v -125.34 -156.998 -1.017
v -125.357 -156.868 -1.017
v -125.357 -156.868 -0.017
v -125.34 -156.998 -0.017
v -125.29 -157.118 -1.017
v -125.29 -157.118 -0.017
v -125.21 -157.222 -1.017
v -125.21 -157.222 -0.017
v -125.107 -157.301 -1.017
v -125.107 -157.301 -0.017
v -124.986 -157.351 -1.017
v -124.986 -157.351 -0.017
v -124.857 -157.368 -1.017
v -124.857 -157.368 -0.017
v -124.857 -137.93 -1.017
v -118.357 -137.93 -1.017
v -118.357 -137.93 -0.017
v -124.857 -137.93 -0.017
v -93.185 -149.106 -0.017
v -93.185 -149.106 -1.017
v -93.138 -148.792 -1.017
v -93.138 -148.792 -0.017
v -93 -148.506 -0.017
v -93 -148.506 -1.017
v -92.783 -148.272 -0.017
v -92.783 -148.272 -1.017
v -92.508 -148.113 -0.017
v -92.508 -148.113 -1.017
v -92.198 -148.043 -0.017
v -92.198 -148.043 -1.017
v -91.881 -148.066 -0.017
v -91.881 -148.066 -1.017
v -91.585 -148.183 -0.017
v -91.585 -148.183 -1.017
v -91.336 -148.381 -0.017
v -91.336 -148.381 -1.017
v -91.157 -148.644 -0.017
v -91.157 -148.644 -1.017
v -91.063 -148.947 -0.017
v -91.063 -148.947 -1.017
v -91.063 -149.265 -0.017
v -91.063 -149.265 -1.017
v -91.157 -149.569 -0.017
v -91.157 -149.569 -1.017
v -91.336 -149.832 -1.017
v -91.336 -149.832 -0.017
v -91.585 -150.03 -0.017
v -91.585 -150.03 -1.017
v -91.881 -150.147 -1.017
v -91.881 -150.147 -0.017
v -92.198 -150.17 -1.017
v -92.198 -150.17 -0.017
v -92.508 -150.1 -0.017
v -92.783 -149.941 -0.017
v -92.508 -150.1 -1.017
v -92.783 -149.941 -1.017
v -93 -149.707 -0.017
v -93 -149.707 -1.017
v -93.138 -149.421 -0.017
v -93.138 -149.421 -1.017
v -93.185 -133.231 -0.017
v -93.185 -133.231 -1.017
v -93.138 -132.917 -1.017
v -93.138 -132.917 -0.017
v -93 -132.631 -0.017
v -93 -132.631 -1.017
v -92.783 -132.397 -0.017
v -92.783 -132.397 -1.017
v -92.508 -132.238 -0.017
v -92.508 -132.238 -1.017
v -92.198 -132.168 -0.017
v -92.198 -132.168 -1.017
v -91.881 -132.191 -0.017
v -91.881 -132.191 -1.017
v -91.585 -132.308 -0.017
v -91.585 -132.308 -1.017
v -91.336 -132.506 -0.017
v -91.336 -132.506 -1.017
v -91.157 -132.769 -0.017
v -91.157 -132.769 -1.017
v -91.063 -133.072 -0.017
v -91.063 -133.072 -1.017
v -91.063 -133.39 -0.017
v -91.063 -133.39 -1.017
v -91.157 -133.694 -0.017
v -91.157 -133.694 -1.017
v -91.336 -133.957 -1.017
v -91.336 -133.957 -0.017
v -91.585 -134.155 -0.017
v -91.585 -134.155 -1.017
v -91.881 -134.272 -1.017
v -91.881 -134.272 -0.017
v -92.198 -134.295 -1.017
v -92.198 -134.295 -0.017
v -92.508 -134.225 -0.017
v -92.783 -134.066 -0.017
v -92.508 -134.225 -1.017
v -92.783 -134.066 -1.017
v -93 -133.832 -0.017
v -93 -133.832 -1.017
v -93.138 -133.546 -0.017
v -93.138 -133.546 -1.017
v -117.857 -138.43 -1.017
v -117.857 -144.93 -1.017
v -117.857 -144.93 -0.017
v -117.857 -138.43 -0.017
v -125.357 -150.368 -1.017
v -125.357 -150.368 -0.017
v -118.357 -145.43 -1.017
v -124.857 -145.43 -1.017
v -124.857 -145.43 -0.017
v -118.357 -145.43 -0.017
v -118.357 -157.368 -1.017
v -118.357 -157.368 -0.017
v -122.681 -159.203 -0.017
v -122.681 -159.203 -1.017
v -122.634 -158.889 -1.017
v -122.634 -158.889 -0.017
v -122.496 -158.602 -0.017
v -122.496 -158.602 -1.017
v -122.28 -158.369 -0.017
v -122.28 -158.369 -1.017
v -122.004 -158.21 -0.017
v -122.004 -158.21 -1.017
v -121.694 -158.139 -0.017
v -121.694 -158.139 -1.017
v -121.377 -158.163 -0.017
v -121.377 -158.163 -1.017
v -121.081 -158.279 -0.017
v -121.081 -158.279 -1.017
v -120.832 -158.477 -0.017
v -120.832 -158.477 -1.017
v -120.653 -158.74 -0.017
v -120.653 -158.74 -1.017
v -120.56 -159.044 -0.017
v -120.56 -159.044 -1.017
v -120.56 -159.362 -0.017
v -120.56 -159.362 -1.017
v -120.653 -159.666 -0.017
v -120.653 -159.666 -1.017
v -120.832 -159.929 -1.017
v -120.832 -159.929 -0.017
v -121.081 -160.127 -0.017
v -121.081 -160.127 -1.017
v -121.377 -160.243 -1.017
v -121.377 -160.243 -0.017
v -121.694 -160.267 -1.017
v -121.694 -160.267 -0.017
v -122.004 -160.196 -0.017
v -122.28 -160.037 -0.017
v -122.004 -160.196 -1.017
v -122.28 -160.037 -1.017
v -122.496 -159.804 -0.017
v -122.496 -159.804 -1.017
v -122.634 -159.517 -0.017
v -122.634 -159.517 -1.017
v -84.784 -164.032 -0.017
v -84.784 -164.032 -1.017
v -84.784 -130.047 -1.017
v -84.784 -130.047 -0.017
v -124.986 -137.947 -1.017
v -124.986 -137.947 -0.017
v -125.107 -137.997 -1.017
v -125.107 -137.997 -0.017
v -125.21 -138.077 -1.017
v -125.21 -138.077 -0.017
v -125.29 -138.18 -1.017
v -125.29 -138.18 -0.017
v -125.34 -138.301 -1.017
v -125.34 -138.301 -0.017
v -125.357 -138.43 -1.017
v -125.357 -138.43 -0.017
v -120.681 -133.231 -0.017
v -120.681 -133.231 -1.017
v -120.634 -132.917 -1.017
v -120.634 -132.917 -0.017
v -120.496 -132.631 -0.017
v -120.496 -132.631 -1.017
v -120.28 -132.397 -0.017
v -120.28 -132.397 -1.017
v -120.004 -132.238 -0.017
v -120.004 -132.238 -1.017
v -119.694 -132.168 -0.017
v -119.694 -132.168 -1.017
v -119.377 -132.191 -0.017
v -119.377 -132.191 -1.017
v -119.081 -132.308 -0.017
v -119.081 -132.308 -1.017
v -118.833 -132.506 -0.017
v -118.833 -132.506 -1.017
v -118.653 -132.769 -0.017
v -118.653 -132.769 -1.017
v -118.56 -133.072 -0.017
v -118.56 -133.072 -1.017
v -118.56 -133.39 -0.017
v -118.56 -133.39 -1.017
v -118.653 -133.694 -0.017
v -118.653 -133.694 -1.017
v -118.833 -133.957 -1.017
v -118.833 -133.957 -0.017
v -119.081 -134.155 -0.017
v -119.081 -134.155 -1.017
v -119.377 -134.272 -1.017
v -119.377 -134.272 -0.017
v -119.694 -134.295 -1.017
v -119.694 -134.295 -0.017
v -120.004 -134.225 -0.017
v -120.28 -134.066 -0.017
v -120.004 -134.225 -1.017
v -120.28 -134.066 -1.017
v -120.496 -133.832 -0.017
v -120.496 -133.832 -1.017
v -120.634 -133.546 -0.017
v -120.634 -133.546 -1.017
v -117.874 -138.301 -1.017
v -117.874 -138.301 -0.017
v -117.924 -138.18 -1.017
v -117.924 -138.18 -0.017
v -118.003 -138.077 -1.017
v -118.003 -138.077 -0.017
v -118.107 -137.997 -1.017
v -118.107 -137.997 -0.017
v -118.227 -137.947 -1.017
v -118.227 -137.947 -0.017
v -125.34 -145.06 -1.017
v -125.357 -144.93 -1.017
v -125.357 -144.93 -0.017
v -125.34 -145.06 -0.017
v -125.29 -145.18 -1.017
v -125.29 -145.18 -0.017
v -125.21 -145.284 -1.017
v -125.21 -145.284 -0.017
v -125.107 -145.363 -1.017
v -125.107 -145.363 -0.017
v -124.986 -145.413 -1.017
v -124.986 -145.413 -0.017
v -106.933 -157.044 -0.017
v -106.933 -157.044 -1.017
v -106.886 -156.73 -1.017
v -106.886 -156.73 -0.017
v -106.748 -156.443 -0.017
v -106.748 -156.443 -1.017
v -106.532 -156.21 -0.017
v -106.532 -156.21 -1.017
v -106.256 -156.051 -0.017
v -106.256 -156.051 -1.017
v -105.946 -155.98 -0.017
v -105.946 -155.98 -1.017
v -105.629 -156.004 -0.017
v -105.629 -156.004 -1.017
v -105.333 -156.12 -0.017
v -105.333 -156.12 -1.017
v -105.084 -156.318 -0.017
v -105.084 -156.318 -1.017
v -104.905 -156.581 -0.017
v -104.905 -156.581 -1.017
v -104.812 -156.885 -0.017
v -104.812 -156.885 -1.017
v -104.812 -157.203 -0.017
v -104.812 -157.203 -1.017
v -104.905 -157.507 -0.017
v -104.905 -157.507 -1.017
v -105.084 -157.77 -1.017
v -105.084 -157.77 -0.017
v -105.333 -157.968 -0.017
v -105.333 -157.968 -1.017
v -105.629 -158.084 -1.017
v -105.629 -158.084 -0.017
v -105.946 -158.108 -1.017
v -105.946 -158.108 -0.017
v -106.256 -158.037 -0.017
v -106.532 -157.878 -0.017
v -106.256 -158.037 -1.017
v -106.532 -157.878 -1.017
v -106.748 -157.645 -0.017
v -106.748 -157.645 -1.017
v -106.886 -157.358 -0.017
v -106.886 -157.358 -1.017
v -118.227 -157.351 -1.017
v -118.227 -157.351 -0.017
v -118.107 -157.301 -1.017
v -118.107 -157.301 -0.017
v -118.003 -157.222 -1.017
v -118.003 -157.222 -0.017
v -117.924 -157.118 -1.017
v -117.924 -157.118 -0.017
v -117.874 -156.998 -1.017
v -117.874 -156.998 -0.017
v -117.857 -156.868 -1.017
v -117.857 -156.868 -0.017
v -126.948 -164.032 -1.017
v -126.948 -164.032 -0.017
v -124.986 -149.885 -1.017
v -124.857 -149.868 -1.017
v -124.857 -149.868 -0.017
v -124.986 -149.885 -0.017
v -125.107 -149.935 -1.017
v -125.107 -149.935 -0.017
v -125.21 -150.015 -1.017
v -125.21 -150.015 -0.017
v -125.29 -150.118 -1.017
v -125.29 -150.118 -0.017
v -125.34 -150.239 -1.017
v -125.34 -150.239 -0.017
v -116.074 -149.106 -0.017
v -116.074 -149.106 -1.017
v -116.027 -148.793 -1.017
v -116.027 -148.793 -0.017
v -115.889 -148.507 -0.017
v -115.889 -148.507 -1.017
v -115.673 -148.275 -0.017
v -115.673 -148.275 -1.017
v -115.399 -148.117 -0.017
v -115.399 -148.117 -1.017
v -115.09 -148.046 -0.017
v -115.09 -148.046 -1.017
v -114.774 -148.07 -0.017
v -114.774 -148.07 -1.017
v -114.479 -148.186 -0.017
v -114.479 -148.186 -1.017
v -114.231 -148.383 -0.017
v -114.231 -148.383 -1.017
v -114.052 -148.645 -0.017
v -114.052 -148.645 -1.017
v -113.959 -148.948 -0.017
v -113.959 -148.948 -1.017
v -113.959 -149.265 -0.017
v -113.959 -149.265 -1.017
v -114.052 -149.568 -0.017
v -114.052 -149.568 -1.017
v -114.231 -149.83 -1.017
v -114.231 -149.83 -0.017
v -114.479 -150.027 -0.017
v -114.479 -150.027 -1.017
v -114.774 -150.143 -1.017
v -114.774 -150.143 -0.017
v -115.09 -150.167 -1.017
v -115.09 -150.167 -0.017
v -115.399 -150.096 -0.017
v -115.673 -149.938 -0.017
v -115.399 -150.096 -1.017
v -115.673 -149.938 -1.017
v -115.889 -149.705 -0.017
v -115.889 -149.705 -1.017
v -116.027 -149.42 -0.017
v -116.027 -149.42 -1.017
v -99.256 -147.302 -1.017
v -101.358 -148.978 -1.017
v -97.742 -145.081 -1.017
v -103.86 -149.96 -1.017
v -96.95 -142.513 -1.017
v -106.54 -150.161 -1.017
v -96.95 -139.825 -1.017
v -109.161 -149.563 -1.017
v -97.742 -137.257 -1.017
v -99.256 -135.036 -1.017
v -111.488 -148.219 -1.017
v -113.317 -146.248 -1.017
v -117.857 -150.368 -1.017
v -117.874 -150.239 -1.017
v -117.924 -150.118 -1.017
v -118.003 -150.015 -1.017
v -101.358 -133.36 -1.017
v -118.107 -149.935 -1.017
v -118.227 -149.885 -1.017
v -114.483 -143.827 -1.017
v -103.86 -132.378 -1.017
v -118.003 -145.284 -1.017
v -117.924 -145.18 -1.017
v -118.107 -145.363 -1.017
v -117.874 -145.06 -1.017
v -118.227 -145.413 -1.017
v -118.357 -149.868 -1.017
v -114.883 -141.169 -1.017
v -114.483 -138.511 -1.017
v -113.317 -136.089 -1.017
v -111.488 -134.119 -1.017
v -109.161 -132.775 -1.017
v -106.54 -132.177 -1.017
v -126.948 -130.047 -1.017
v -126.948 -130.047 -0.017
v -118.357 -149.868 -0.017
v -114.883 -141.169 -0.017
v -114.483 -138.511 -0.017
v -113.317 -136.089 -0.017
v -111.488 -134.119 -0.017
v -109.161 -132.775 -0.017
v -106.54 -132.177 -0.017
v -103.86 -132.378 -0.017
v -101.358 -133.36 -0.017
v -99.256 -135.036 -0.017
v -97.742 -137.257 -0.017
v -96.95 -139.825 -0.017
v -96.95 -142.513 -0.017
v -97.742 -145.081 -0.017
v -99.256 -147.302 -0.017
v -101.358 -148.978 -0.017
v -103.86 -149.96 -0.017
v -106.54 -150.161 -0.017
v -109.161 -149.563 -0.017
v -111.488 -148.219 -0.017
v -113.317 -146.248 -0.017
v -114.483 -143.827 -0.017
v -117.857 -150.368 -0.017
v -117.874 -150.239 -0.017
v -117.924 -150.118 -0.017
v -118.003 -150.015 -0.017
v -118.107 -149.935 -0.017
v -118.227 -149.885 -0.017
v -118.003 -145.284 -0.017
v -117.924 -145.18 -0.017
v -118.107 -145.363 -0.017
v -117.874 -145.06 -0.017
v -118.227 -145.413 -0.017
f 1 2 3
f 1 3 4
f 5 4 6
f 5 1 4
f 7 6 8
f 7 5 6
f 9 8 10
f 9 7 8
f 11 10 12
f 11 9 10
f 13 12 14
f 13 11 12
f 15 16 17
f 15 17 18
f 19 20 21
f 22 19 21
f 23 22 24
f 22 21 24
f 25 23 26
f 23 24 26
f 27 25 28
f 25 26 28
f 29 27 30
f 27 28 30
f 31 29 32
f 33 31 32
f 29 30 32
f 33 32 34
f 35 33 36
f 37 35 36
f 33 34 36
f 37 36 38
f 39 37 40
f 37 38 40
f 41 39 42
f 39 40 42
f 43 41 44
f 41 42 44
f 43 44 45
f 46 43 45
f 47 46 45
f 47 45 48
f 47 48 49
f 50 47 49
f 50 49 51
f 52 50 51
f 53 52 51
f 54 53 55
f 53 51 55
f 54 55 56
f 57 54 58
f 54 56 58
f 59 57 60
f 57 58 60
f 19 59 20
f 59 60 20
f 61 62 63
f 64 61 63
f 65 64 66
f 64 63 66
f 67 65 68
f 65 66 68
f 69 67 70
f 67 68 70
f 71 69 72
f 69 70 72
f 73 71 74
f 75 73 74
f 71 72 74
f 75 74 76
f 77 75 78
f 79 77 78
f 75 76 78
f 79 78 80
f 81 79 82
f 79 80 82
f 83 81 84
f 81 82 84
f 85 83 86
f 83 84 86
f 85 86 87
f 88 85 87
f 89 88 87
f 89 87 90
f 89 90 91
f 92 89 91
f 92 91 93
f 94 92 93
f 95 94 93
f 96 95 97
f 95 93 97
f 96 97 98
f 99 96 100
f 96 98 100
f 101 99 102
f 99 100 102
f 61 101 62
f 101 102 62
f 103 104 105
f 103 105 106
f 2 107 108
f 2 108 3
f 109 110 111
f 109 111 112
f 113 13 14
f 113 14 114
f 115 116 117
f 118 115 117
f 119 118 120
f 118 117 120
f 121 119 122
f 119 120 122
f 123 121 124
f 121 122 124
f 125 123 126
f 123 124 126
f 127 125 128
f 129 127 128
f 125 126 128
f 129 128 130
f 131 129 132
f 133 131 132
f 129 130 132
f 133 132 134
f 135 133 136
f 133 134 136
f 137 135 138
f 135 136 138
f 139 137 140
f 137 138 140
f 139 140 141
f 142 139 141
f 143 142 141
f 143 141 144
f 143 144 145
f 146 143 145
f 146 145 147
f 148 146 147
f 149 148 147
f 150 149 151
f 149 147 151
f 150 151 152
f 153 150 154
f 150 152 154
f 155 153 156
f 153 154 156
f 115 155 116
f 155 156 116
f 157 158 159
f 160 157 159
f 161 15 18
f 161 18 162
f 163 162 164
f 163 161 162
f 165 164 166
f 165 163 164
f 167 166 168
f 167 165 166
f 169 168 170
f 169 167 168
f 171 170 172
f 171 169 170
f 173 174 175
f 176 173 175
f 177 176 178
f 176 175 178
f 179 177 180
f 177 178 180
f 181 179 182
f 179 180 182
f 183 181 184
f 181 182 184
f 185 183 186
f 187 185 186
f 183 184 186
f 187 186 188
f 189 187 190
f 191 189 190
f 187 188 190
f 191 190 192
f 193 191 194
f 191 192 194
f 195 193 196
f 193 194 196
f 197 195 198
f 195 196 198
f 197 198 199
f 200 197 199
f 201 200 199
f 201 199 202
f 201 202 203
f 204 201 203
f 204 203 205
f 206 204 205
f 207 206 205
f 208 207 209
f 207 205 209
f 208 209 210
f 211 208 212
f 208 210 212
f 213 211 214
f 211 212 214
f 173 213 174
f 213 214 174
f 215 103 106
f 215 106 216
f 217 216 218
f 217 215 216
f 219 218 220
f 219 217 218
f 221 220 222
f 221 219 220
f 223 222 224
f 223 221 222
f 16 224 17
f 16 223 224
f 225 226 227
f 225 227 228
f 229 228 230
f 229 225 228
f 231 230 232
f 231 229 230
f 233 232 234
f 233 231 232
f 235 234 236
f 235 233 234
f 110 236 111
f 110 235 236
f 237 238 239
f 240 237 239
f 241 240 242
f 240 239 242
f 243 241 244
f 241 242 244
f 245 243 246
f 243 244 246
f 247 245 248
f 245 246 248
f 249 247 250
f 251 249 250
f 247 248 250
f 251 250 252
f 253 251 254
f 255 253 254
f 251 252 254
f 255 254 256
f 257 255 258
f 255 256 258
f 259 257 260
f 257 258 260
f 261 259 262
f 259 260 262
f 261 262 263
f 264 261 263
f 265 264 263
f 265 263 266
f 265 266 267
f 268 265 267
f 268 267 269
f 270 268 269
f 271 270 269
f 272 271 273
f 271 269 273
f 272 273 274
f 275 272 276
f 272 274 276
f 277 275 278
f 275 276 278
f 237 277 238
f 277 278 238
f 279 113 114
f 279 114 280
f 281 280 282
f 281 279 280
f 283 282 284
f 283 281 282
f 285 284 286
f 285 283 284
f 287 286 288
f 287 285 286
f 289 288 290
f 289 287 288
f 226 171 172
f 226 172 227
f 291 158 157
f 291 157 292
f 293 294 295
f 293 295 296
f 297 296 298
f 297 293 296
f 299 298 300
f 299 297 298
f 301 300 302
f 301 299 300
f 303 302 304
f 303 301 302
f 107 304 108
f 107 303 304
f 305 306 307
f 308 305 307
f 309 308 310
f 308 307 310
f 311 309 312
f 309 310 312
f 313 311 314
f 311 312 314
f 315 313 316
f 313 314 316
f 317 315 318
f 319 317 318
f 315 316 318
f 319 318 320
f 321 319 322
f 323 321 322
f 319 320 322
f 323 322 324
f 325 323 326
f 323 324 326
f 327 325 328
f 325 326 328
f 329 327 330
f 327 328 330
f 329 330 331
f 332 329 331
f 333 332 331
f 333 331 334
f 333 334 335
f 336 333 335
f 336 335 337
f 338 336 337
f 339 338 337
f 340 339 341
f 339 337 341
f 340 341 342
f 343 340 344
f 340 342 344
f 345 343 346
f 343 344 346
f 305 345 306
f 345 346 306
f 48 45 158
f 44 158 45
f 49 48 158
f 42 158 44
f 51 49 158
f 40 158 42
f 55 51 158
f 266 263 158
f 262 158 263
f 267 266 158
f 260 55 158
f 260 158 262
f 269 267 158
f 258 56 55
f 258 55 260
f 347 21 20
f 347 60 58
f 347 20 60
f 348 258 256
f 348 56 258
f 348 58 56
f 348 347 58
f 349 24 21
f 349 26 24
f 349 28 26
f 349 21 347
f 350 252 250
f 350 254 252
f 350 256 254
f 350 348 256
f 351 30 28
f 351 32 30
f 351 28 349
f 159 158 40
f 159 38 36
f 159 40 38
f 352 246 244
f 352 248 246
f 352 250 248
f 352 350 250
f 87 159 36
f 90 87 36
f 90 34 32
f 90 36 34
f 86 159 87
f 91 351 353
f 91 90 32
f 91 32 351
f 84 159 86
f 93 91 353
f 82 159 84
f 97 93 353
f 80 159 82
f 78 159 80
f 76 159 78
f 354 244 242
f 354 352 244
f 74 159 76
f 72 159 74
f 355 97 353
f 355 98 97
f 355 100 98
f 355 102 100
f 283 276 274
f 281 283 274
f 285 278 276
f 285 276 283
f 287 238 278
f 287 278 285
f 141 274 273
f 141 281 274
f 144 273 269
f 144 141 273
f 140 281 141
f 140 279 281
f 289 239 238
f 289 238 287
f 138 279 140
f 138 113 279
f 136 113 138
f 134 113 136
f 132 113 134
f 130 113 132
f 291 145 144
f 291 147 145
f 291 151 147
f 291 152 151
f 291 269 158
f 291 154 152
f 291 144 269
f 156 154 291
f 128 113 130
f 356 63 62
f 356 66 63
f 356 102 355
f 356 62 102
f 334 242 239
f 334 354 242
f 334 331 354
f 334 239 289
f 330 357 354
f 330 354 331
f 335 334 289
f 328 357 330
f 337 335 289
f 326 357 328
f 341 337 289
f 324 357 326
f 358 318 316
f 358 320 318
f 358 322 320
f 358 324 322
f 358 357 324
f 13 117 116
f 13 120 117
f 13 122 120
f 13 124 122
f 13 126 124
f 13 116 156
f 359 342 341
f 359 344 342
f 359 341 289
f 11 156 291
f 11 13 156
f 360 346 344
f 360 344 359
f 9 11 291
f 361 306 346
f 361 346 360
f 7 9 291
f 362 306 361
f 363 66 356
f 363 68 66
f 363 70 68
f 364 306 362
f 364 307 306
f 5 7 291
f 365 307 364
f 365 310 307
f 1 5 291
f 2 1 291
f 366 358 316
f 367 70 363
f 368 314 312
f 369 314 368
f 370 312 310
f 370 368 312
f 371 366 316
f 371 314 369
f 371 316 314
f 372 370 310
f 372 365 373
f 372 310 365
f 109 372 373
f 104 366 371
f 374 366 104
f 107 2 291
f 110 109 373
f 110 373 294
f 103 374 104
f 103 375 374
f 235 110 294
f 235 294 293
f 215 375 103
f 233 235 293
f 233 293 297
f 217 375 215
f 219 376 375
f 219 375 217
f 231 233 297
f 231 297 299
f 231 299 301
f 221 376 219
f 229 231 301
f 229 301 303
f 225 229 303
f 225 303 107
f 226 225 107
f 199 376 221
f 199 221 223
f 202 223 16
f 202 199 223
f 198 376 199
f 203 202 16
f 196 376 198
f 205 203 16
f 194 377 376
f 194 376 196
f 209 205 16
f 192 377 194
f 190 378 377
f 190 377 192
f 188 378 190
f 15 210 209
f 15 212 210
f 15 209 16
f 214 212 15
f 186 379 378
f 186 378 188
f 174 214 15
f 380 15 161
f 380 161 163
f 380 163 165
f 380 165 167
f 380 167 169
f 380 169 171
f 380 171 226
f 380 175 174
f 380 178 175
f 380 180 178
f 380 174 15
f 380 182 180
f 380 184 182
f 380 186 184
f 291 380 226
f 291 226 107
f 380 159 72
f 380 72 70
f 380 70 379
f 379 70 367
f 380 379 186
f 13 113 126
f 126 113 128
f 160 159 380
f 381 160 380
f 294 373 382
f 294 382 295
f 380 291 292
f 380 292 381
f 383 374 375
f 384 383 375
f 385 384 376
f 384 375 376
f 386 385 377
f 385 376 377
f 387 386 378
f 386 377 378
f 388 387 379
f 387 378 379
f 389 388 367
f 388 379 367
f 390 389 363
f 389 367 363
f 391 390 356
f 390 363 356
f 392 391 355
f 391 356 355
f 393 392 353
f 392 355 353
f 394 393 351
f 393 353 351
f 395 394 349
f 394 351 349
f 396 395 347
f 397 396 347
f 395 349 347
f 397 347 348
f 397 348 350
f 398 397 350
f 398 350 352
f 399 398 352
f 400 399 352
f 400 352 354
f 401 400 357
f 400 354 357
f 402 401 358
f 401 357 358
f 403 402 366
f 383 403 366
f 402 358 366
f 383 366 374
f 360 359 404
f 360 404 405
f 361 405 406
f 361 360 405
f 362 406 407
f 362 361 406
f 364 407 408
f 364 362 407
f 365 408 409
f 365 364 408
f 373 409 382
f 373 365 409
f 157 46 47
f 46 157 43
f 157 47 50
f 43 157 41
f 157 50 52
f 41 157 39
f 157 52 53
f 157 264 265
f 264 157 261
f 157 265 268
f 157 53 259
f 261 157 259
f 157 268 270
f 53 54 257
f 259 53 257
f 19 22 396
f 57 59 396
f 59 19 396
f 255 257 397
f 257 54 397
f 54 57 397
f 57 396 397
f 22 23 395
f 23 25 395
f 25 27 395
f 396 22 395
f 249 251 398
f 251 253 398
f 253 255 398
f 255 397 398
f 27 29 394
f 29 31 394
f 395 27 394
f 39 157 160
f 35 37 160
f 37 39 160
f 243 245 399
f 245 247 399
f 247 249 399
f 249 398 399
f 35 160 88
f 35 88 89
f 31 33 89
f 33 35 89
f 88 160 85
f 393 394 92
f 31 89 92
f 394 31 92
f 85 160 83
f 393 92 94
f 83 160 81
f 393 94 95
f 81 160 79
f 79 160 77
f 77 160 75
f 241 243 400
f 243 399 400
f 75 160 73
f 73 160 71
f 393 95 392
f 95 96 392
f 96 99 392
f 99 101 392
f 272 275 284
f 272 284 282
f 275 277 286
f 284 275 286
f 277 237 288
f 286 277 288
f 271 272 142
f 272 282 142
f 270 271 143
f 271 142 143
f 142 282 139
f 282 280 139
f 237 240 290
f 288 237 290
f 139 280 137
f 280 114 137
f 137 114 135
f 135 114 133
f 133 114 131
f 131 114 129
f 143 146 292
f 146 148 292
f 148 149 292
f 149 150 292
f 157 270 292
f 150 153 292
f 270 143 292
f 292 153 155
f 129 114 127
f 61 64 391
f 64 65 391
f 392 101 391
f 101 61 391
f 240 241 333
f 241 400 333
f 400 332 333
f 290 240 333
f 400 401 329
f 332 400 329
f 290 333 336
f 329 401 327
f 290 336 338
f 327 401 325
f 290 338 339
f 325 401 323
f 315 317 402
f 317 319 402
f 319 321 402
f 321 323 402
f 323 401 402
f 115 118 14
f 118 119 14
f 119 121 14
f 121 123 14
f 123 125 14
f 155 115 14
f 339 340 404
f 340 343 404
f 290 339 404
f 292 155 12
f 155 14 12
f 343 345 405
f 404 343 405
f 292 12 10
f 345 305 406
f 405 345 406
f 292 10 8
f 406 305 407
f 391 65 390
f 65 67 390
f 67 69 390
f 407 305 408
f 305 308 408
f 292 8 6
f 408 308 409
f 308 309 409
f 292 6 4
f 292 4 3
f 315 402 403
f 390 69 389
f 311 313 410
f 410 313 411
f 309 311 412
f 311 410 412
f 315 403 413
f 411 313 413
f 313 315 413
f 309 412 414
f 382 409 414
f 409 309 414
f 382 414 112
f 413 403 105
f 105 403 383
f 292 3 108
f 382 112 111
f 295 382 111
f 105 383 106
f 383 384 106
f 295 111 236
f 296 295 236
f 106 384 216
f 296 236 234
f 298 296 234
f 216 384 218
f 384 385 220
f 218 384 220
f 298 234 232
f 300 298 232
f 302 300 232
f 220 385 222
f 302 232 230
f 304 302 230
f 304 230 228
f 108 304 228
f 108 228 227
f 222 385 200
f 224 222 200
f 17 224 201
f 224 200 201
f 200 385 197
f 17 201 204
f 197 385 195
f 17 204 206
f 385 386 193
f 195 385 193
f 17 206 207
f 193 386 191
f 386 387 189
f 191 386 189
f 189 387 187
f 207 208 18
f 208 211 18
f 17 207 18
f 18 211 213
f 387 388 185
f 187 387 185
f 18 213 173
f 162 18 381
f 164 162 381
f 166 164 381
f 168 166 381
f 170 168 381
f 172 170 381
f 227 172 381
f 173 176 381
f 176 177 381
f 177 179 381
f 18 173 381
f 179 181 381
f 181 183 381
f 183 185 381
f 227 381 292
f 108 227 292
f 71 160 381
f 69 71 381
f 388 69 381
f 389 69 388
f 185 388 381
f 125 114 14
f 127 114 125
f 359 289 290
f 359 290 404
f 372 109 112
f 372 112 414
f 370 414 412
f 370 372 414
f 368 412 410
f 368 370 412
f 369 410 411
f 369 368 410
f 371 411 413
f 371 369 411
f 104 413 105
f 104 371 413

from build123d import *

# Parameters (mm, degrees)
SKETCH1_W           = 42.164
SKETCH1_H           = 33.9852
SKETCH1_R           = 9.017
SKETCH1_R_2         = 1.0668
SKETCH1_R_3         = 1.063335115
BOSS_EXTRUDE1_DEPTH = 1


with BuildPart() as part:
    # Sketch1 → Boss-Extrude1 (new body)
    with BuildSketch(Plane(origin=(0, 0, -1.017418828), x_dir=(-1, 0, 0), z_dir=(0, 0, -1))):
        with Locations((105.86640625, -147.03953125)):
            Rectangle(SKETCH1_W, SKETCH1_H)
        with Locations((105.86640625, -141.16895625)):
            Circle(SKETCH1_R, mode=Mode.SUBTRACT)
        with Locations((92.118252965, -149.10645625)):
            Circle(SKETCH1_R_2, mode=Mode.SUBTRACT)
        with Locations((92.118252965, -133.23145625)):
            Circle(SKETCH1_R_2, mode=Mode.SUBTRACT)
        with Locations((119.614559536, -133.23145625)):
            Circle(SKETCH1_R_2, mode=Mode.SUBTRACT)
        with Locations((105.86640625, -157.04395625)):
            Circle(SKETCH1_R_2, mode=Mode.SUBTRACT)
        with Locations((115.01040625, -149.10645625)):
            Circle(SKETCH1_R_3, mode=Mode.SUBTRACT)
        with Locations((121.614405679, -159.20295625)):
            Circle(SKETCH1_R_2, mode=Mode.SUBTRACT)
        with BuildLine():
            Line((118.356545978, -137.93013125), (124.856545978, -137.93013125))
            ThreePointArc((124.856545978, -137.93013125), (125.210099369, -138.07657786), (125.356545978, -138.43013125))
            Line((125.356545978, -138.43013125), (125.356545978, -144.93013125))
            ThreePointArc((125.356545978, -144.93013125), (125.210099369, -145.283684641), (124.856545978, -145.43013125))
            Line((124.856545978, -145.43013125), (118.356545978, -145.43013125))
            ThreePointArc((118.356545978, -145.43013125), (118.002992588, -145.283684641), (117.856545978, -144.93013125))
            Line((117.856545978, -144.93013125), (117.856545978, -138.43013125))
            ThreePointArc((117.856545978, -138.43013125), (118.002992588, -138.07657786), (118.356545978, -137.93013125))
        make_face(mode=Mode.SUBTRACT)
        with BuildLine():
            Line((124.856545978, -157.36813125), (118.356545978, -157.36813125))
            ThreePointArc((118.356545978, -157.36813125), (118.002992588, -157.221684641), (117.856545978, -156.86813125))
            Line((117.856545978, -156.86813125), (117.856545978, -150.36813125))
            ThreePointArc((117.856545978, -150.36813125), (118.002992588, -150.01457786), (118.356545978, -149.86813125))
            Line((118.356545978, -149.86813125), (124.856545978, -149.86813125))
            ThreePointArc((124.856545978, -149.86813125), (125.210099369, -150.01457786), (125.356545978, -150.36813125))
            Line((125.356545978, -150.36813125), (125.356545978, -156.86813125))
            ThreePointArc((125.356545978, -156.86813125), (125.210099369, -157.221684641), (124.856545978, -157.36813125))
        make_face(mode=Mode.SUBTRACT)
    extrude(amount=-BOSS_EXTRUDE1_DEPTH)


solid = part.part
